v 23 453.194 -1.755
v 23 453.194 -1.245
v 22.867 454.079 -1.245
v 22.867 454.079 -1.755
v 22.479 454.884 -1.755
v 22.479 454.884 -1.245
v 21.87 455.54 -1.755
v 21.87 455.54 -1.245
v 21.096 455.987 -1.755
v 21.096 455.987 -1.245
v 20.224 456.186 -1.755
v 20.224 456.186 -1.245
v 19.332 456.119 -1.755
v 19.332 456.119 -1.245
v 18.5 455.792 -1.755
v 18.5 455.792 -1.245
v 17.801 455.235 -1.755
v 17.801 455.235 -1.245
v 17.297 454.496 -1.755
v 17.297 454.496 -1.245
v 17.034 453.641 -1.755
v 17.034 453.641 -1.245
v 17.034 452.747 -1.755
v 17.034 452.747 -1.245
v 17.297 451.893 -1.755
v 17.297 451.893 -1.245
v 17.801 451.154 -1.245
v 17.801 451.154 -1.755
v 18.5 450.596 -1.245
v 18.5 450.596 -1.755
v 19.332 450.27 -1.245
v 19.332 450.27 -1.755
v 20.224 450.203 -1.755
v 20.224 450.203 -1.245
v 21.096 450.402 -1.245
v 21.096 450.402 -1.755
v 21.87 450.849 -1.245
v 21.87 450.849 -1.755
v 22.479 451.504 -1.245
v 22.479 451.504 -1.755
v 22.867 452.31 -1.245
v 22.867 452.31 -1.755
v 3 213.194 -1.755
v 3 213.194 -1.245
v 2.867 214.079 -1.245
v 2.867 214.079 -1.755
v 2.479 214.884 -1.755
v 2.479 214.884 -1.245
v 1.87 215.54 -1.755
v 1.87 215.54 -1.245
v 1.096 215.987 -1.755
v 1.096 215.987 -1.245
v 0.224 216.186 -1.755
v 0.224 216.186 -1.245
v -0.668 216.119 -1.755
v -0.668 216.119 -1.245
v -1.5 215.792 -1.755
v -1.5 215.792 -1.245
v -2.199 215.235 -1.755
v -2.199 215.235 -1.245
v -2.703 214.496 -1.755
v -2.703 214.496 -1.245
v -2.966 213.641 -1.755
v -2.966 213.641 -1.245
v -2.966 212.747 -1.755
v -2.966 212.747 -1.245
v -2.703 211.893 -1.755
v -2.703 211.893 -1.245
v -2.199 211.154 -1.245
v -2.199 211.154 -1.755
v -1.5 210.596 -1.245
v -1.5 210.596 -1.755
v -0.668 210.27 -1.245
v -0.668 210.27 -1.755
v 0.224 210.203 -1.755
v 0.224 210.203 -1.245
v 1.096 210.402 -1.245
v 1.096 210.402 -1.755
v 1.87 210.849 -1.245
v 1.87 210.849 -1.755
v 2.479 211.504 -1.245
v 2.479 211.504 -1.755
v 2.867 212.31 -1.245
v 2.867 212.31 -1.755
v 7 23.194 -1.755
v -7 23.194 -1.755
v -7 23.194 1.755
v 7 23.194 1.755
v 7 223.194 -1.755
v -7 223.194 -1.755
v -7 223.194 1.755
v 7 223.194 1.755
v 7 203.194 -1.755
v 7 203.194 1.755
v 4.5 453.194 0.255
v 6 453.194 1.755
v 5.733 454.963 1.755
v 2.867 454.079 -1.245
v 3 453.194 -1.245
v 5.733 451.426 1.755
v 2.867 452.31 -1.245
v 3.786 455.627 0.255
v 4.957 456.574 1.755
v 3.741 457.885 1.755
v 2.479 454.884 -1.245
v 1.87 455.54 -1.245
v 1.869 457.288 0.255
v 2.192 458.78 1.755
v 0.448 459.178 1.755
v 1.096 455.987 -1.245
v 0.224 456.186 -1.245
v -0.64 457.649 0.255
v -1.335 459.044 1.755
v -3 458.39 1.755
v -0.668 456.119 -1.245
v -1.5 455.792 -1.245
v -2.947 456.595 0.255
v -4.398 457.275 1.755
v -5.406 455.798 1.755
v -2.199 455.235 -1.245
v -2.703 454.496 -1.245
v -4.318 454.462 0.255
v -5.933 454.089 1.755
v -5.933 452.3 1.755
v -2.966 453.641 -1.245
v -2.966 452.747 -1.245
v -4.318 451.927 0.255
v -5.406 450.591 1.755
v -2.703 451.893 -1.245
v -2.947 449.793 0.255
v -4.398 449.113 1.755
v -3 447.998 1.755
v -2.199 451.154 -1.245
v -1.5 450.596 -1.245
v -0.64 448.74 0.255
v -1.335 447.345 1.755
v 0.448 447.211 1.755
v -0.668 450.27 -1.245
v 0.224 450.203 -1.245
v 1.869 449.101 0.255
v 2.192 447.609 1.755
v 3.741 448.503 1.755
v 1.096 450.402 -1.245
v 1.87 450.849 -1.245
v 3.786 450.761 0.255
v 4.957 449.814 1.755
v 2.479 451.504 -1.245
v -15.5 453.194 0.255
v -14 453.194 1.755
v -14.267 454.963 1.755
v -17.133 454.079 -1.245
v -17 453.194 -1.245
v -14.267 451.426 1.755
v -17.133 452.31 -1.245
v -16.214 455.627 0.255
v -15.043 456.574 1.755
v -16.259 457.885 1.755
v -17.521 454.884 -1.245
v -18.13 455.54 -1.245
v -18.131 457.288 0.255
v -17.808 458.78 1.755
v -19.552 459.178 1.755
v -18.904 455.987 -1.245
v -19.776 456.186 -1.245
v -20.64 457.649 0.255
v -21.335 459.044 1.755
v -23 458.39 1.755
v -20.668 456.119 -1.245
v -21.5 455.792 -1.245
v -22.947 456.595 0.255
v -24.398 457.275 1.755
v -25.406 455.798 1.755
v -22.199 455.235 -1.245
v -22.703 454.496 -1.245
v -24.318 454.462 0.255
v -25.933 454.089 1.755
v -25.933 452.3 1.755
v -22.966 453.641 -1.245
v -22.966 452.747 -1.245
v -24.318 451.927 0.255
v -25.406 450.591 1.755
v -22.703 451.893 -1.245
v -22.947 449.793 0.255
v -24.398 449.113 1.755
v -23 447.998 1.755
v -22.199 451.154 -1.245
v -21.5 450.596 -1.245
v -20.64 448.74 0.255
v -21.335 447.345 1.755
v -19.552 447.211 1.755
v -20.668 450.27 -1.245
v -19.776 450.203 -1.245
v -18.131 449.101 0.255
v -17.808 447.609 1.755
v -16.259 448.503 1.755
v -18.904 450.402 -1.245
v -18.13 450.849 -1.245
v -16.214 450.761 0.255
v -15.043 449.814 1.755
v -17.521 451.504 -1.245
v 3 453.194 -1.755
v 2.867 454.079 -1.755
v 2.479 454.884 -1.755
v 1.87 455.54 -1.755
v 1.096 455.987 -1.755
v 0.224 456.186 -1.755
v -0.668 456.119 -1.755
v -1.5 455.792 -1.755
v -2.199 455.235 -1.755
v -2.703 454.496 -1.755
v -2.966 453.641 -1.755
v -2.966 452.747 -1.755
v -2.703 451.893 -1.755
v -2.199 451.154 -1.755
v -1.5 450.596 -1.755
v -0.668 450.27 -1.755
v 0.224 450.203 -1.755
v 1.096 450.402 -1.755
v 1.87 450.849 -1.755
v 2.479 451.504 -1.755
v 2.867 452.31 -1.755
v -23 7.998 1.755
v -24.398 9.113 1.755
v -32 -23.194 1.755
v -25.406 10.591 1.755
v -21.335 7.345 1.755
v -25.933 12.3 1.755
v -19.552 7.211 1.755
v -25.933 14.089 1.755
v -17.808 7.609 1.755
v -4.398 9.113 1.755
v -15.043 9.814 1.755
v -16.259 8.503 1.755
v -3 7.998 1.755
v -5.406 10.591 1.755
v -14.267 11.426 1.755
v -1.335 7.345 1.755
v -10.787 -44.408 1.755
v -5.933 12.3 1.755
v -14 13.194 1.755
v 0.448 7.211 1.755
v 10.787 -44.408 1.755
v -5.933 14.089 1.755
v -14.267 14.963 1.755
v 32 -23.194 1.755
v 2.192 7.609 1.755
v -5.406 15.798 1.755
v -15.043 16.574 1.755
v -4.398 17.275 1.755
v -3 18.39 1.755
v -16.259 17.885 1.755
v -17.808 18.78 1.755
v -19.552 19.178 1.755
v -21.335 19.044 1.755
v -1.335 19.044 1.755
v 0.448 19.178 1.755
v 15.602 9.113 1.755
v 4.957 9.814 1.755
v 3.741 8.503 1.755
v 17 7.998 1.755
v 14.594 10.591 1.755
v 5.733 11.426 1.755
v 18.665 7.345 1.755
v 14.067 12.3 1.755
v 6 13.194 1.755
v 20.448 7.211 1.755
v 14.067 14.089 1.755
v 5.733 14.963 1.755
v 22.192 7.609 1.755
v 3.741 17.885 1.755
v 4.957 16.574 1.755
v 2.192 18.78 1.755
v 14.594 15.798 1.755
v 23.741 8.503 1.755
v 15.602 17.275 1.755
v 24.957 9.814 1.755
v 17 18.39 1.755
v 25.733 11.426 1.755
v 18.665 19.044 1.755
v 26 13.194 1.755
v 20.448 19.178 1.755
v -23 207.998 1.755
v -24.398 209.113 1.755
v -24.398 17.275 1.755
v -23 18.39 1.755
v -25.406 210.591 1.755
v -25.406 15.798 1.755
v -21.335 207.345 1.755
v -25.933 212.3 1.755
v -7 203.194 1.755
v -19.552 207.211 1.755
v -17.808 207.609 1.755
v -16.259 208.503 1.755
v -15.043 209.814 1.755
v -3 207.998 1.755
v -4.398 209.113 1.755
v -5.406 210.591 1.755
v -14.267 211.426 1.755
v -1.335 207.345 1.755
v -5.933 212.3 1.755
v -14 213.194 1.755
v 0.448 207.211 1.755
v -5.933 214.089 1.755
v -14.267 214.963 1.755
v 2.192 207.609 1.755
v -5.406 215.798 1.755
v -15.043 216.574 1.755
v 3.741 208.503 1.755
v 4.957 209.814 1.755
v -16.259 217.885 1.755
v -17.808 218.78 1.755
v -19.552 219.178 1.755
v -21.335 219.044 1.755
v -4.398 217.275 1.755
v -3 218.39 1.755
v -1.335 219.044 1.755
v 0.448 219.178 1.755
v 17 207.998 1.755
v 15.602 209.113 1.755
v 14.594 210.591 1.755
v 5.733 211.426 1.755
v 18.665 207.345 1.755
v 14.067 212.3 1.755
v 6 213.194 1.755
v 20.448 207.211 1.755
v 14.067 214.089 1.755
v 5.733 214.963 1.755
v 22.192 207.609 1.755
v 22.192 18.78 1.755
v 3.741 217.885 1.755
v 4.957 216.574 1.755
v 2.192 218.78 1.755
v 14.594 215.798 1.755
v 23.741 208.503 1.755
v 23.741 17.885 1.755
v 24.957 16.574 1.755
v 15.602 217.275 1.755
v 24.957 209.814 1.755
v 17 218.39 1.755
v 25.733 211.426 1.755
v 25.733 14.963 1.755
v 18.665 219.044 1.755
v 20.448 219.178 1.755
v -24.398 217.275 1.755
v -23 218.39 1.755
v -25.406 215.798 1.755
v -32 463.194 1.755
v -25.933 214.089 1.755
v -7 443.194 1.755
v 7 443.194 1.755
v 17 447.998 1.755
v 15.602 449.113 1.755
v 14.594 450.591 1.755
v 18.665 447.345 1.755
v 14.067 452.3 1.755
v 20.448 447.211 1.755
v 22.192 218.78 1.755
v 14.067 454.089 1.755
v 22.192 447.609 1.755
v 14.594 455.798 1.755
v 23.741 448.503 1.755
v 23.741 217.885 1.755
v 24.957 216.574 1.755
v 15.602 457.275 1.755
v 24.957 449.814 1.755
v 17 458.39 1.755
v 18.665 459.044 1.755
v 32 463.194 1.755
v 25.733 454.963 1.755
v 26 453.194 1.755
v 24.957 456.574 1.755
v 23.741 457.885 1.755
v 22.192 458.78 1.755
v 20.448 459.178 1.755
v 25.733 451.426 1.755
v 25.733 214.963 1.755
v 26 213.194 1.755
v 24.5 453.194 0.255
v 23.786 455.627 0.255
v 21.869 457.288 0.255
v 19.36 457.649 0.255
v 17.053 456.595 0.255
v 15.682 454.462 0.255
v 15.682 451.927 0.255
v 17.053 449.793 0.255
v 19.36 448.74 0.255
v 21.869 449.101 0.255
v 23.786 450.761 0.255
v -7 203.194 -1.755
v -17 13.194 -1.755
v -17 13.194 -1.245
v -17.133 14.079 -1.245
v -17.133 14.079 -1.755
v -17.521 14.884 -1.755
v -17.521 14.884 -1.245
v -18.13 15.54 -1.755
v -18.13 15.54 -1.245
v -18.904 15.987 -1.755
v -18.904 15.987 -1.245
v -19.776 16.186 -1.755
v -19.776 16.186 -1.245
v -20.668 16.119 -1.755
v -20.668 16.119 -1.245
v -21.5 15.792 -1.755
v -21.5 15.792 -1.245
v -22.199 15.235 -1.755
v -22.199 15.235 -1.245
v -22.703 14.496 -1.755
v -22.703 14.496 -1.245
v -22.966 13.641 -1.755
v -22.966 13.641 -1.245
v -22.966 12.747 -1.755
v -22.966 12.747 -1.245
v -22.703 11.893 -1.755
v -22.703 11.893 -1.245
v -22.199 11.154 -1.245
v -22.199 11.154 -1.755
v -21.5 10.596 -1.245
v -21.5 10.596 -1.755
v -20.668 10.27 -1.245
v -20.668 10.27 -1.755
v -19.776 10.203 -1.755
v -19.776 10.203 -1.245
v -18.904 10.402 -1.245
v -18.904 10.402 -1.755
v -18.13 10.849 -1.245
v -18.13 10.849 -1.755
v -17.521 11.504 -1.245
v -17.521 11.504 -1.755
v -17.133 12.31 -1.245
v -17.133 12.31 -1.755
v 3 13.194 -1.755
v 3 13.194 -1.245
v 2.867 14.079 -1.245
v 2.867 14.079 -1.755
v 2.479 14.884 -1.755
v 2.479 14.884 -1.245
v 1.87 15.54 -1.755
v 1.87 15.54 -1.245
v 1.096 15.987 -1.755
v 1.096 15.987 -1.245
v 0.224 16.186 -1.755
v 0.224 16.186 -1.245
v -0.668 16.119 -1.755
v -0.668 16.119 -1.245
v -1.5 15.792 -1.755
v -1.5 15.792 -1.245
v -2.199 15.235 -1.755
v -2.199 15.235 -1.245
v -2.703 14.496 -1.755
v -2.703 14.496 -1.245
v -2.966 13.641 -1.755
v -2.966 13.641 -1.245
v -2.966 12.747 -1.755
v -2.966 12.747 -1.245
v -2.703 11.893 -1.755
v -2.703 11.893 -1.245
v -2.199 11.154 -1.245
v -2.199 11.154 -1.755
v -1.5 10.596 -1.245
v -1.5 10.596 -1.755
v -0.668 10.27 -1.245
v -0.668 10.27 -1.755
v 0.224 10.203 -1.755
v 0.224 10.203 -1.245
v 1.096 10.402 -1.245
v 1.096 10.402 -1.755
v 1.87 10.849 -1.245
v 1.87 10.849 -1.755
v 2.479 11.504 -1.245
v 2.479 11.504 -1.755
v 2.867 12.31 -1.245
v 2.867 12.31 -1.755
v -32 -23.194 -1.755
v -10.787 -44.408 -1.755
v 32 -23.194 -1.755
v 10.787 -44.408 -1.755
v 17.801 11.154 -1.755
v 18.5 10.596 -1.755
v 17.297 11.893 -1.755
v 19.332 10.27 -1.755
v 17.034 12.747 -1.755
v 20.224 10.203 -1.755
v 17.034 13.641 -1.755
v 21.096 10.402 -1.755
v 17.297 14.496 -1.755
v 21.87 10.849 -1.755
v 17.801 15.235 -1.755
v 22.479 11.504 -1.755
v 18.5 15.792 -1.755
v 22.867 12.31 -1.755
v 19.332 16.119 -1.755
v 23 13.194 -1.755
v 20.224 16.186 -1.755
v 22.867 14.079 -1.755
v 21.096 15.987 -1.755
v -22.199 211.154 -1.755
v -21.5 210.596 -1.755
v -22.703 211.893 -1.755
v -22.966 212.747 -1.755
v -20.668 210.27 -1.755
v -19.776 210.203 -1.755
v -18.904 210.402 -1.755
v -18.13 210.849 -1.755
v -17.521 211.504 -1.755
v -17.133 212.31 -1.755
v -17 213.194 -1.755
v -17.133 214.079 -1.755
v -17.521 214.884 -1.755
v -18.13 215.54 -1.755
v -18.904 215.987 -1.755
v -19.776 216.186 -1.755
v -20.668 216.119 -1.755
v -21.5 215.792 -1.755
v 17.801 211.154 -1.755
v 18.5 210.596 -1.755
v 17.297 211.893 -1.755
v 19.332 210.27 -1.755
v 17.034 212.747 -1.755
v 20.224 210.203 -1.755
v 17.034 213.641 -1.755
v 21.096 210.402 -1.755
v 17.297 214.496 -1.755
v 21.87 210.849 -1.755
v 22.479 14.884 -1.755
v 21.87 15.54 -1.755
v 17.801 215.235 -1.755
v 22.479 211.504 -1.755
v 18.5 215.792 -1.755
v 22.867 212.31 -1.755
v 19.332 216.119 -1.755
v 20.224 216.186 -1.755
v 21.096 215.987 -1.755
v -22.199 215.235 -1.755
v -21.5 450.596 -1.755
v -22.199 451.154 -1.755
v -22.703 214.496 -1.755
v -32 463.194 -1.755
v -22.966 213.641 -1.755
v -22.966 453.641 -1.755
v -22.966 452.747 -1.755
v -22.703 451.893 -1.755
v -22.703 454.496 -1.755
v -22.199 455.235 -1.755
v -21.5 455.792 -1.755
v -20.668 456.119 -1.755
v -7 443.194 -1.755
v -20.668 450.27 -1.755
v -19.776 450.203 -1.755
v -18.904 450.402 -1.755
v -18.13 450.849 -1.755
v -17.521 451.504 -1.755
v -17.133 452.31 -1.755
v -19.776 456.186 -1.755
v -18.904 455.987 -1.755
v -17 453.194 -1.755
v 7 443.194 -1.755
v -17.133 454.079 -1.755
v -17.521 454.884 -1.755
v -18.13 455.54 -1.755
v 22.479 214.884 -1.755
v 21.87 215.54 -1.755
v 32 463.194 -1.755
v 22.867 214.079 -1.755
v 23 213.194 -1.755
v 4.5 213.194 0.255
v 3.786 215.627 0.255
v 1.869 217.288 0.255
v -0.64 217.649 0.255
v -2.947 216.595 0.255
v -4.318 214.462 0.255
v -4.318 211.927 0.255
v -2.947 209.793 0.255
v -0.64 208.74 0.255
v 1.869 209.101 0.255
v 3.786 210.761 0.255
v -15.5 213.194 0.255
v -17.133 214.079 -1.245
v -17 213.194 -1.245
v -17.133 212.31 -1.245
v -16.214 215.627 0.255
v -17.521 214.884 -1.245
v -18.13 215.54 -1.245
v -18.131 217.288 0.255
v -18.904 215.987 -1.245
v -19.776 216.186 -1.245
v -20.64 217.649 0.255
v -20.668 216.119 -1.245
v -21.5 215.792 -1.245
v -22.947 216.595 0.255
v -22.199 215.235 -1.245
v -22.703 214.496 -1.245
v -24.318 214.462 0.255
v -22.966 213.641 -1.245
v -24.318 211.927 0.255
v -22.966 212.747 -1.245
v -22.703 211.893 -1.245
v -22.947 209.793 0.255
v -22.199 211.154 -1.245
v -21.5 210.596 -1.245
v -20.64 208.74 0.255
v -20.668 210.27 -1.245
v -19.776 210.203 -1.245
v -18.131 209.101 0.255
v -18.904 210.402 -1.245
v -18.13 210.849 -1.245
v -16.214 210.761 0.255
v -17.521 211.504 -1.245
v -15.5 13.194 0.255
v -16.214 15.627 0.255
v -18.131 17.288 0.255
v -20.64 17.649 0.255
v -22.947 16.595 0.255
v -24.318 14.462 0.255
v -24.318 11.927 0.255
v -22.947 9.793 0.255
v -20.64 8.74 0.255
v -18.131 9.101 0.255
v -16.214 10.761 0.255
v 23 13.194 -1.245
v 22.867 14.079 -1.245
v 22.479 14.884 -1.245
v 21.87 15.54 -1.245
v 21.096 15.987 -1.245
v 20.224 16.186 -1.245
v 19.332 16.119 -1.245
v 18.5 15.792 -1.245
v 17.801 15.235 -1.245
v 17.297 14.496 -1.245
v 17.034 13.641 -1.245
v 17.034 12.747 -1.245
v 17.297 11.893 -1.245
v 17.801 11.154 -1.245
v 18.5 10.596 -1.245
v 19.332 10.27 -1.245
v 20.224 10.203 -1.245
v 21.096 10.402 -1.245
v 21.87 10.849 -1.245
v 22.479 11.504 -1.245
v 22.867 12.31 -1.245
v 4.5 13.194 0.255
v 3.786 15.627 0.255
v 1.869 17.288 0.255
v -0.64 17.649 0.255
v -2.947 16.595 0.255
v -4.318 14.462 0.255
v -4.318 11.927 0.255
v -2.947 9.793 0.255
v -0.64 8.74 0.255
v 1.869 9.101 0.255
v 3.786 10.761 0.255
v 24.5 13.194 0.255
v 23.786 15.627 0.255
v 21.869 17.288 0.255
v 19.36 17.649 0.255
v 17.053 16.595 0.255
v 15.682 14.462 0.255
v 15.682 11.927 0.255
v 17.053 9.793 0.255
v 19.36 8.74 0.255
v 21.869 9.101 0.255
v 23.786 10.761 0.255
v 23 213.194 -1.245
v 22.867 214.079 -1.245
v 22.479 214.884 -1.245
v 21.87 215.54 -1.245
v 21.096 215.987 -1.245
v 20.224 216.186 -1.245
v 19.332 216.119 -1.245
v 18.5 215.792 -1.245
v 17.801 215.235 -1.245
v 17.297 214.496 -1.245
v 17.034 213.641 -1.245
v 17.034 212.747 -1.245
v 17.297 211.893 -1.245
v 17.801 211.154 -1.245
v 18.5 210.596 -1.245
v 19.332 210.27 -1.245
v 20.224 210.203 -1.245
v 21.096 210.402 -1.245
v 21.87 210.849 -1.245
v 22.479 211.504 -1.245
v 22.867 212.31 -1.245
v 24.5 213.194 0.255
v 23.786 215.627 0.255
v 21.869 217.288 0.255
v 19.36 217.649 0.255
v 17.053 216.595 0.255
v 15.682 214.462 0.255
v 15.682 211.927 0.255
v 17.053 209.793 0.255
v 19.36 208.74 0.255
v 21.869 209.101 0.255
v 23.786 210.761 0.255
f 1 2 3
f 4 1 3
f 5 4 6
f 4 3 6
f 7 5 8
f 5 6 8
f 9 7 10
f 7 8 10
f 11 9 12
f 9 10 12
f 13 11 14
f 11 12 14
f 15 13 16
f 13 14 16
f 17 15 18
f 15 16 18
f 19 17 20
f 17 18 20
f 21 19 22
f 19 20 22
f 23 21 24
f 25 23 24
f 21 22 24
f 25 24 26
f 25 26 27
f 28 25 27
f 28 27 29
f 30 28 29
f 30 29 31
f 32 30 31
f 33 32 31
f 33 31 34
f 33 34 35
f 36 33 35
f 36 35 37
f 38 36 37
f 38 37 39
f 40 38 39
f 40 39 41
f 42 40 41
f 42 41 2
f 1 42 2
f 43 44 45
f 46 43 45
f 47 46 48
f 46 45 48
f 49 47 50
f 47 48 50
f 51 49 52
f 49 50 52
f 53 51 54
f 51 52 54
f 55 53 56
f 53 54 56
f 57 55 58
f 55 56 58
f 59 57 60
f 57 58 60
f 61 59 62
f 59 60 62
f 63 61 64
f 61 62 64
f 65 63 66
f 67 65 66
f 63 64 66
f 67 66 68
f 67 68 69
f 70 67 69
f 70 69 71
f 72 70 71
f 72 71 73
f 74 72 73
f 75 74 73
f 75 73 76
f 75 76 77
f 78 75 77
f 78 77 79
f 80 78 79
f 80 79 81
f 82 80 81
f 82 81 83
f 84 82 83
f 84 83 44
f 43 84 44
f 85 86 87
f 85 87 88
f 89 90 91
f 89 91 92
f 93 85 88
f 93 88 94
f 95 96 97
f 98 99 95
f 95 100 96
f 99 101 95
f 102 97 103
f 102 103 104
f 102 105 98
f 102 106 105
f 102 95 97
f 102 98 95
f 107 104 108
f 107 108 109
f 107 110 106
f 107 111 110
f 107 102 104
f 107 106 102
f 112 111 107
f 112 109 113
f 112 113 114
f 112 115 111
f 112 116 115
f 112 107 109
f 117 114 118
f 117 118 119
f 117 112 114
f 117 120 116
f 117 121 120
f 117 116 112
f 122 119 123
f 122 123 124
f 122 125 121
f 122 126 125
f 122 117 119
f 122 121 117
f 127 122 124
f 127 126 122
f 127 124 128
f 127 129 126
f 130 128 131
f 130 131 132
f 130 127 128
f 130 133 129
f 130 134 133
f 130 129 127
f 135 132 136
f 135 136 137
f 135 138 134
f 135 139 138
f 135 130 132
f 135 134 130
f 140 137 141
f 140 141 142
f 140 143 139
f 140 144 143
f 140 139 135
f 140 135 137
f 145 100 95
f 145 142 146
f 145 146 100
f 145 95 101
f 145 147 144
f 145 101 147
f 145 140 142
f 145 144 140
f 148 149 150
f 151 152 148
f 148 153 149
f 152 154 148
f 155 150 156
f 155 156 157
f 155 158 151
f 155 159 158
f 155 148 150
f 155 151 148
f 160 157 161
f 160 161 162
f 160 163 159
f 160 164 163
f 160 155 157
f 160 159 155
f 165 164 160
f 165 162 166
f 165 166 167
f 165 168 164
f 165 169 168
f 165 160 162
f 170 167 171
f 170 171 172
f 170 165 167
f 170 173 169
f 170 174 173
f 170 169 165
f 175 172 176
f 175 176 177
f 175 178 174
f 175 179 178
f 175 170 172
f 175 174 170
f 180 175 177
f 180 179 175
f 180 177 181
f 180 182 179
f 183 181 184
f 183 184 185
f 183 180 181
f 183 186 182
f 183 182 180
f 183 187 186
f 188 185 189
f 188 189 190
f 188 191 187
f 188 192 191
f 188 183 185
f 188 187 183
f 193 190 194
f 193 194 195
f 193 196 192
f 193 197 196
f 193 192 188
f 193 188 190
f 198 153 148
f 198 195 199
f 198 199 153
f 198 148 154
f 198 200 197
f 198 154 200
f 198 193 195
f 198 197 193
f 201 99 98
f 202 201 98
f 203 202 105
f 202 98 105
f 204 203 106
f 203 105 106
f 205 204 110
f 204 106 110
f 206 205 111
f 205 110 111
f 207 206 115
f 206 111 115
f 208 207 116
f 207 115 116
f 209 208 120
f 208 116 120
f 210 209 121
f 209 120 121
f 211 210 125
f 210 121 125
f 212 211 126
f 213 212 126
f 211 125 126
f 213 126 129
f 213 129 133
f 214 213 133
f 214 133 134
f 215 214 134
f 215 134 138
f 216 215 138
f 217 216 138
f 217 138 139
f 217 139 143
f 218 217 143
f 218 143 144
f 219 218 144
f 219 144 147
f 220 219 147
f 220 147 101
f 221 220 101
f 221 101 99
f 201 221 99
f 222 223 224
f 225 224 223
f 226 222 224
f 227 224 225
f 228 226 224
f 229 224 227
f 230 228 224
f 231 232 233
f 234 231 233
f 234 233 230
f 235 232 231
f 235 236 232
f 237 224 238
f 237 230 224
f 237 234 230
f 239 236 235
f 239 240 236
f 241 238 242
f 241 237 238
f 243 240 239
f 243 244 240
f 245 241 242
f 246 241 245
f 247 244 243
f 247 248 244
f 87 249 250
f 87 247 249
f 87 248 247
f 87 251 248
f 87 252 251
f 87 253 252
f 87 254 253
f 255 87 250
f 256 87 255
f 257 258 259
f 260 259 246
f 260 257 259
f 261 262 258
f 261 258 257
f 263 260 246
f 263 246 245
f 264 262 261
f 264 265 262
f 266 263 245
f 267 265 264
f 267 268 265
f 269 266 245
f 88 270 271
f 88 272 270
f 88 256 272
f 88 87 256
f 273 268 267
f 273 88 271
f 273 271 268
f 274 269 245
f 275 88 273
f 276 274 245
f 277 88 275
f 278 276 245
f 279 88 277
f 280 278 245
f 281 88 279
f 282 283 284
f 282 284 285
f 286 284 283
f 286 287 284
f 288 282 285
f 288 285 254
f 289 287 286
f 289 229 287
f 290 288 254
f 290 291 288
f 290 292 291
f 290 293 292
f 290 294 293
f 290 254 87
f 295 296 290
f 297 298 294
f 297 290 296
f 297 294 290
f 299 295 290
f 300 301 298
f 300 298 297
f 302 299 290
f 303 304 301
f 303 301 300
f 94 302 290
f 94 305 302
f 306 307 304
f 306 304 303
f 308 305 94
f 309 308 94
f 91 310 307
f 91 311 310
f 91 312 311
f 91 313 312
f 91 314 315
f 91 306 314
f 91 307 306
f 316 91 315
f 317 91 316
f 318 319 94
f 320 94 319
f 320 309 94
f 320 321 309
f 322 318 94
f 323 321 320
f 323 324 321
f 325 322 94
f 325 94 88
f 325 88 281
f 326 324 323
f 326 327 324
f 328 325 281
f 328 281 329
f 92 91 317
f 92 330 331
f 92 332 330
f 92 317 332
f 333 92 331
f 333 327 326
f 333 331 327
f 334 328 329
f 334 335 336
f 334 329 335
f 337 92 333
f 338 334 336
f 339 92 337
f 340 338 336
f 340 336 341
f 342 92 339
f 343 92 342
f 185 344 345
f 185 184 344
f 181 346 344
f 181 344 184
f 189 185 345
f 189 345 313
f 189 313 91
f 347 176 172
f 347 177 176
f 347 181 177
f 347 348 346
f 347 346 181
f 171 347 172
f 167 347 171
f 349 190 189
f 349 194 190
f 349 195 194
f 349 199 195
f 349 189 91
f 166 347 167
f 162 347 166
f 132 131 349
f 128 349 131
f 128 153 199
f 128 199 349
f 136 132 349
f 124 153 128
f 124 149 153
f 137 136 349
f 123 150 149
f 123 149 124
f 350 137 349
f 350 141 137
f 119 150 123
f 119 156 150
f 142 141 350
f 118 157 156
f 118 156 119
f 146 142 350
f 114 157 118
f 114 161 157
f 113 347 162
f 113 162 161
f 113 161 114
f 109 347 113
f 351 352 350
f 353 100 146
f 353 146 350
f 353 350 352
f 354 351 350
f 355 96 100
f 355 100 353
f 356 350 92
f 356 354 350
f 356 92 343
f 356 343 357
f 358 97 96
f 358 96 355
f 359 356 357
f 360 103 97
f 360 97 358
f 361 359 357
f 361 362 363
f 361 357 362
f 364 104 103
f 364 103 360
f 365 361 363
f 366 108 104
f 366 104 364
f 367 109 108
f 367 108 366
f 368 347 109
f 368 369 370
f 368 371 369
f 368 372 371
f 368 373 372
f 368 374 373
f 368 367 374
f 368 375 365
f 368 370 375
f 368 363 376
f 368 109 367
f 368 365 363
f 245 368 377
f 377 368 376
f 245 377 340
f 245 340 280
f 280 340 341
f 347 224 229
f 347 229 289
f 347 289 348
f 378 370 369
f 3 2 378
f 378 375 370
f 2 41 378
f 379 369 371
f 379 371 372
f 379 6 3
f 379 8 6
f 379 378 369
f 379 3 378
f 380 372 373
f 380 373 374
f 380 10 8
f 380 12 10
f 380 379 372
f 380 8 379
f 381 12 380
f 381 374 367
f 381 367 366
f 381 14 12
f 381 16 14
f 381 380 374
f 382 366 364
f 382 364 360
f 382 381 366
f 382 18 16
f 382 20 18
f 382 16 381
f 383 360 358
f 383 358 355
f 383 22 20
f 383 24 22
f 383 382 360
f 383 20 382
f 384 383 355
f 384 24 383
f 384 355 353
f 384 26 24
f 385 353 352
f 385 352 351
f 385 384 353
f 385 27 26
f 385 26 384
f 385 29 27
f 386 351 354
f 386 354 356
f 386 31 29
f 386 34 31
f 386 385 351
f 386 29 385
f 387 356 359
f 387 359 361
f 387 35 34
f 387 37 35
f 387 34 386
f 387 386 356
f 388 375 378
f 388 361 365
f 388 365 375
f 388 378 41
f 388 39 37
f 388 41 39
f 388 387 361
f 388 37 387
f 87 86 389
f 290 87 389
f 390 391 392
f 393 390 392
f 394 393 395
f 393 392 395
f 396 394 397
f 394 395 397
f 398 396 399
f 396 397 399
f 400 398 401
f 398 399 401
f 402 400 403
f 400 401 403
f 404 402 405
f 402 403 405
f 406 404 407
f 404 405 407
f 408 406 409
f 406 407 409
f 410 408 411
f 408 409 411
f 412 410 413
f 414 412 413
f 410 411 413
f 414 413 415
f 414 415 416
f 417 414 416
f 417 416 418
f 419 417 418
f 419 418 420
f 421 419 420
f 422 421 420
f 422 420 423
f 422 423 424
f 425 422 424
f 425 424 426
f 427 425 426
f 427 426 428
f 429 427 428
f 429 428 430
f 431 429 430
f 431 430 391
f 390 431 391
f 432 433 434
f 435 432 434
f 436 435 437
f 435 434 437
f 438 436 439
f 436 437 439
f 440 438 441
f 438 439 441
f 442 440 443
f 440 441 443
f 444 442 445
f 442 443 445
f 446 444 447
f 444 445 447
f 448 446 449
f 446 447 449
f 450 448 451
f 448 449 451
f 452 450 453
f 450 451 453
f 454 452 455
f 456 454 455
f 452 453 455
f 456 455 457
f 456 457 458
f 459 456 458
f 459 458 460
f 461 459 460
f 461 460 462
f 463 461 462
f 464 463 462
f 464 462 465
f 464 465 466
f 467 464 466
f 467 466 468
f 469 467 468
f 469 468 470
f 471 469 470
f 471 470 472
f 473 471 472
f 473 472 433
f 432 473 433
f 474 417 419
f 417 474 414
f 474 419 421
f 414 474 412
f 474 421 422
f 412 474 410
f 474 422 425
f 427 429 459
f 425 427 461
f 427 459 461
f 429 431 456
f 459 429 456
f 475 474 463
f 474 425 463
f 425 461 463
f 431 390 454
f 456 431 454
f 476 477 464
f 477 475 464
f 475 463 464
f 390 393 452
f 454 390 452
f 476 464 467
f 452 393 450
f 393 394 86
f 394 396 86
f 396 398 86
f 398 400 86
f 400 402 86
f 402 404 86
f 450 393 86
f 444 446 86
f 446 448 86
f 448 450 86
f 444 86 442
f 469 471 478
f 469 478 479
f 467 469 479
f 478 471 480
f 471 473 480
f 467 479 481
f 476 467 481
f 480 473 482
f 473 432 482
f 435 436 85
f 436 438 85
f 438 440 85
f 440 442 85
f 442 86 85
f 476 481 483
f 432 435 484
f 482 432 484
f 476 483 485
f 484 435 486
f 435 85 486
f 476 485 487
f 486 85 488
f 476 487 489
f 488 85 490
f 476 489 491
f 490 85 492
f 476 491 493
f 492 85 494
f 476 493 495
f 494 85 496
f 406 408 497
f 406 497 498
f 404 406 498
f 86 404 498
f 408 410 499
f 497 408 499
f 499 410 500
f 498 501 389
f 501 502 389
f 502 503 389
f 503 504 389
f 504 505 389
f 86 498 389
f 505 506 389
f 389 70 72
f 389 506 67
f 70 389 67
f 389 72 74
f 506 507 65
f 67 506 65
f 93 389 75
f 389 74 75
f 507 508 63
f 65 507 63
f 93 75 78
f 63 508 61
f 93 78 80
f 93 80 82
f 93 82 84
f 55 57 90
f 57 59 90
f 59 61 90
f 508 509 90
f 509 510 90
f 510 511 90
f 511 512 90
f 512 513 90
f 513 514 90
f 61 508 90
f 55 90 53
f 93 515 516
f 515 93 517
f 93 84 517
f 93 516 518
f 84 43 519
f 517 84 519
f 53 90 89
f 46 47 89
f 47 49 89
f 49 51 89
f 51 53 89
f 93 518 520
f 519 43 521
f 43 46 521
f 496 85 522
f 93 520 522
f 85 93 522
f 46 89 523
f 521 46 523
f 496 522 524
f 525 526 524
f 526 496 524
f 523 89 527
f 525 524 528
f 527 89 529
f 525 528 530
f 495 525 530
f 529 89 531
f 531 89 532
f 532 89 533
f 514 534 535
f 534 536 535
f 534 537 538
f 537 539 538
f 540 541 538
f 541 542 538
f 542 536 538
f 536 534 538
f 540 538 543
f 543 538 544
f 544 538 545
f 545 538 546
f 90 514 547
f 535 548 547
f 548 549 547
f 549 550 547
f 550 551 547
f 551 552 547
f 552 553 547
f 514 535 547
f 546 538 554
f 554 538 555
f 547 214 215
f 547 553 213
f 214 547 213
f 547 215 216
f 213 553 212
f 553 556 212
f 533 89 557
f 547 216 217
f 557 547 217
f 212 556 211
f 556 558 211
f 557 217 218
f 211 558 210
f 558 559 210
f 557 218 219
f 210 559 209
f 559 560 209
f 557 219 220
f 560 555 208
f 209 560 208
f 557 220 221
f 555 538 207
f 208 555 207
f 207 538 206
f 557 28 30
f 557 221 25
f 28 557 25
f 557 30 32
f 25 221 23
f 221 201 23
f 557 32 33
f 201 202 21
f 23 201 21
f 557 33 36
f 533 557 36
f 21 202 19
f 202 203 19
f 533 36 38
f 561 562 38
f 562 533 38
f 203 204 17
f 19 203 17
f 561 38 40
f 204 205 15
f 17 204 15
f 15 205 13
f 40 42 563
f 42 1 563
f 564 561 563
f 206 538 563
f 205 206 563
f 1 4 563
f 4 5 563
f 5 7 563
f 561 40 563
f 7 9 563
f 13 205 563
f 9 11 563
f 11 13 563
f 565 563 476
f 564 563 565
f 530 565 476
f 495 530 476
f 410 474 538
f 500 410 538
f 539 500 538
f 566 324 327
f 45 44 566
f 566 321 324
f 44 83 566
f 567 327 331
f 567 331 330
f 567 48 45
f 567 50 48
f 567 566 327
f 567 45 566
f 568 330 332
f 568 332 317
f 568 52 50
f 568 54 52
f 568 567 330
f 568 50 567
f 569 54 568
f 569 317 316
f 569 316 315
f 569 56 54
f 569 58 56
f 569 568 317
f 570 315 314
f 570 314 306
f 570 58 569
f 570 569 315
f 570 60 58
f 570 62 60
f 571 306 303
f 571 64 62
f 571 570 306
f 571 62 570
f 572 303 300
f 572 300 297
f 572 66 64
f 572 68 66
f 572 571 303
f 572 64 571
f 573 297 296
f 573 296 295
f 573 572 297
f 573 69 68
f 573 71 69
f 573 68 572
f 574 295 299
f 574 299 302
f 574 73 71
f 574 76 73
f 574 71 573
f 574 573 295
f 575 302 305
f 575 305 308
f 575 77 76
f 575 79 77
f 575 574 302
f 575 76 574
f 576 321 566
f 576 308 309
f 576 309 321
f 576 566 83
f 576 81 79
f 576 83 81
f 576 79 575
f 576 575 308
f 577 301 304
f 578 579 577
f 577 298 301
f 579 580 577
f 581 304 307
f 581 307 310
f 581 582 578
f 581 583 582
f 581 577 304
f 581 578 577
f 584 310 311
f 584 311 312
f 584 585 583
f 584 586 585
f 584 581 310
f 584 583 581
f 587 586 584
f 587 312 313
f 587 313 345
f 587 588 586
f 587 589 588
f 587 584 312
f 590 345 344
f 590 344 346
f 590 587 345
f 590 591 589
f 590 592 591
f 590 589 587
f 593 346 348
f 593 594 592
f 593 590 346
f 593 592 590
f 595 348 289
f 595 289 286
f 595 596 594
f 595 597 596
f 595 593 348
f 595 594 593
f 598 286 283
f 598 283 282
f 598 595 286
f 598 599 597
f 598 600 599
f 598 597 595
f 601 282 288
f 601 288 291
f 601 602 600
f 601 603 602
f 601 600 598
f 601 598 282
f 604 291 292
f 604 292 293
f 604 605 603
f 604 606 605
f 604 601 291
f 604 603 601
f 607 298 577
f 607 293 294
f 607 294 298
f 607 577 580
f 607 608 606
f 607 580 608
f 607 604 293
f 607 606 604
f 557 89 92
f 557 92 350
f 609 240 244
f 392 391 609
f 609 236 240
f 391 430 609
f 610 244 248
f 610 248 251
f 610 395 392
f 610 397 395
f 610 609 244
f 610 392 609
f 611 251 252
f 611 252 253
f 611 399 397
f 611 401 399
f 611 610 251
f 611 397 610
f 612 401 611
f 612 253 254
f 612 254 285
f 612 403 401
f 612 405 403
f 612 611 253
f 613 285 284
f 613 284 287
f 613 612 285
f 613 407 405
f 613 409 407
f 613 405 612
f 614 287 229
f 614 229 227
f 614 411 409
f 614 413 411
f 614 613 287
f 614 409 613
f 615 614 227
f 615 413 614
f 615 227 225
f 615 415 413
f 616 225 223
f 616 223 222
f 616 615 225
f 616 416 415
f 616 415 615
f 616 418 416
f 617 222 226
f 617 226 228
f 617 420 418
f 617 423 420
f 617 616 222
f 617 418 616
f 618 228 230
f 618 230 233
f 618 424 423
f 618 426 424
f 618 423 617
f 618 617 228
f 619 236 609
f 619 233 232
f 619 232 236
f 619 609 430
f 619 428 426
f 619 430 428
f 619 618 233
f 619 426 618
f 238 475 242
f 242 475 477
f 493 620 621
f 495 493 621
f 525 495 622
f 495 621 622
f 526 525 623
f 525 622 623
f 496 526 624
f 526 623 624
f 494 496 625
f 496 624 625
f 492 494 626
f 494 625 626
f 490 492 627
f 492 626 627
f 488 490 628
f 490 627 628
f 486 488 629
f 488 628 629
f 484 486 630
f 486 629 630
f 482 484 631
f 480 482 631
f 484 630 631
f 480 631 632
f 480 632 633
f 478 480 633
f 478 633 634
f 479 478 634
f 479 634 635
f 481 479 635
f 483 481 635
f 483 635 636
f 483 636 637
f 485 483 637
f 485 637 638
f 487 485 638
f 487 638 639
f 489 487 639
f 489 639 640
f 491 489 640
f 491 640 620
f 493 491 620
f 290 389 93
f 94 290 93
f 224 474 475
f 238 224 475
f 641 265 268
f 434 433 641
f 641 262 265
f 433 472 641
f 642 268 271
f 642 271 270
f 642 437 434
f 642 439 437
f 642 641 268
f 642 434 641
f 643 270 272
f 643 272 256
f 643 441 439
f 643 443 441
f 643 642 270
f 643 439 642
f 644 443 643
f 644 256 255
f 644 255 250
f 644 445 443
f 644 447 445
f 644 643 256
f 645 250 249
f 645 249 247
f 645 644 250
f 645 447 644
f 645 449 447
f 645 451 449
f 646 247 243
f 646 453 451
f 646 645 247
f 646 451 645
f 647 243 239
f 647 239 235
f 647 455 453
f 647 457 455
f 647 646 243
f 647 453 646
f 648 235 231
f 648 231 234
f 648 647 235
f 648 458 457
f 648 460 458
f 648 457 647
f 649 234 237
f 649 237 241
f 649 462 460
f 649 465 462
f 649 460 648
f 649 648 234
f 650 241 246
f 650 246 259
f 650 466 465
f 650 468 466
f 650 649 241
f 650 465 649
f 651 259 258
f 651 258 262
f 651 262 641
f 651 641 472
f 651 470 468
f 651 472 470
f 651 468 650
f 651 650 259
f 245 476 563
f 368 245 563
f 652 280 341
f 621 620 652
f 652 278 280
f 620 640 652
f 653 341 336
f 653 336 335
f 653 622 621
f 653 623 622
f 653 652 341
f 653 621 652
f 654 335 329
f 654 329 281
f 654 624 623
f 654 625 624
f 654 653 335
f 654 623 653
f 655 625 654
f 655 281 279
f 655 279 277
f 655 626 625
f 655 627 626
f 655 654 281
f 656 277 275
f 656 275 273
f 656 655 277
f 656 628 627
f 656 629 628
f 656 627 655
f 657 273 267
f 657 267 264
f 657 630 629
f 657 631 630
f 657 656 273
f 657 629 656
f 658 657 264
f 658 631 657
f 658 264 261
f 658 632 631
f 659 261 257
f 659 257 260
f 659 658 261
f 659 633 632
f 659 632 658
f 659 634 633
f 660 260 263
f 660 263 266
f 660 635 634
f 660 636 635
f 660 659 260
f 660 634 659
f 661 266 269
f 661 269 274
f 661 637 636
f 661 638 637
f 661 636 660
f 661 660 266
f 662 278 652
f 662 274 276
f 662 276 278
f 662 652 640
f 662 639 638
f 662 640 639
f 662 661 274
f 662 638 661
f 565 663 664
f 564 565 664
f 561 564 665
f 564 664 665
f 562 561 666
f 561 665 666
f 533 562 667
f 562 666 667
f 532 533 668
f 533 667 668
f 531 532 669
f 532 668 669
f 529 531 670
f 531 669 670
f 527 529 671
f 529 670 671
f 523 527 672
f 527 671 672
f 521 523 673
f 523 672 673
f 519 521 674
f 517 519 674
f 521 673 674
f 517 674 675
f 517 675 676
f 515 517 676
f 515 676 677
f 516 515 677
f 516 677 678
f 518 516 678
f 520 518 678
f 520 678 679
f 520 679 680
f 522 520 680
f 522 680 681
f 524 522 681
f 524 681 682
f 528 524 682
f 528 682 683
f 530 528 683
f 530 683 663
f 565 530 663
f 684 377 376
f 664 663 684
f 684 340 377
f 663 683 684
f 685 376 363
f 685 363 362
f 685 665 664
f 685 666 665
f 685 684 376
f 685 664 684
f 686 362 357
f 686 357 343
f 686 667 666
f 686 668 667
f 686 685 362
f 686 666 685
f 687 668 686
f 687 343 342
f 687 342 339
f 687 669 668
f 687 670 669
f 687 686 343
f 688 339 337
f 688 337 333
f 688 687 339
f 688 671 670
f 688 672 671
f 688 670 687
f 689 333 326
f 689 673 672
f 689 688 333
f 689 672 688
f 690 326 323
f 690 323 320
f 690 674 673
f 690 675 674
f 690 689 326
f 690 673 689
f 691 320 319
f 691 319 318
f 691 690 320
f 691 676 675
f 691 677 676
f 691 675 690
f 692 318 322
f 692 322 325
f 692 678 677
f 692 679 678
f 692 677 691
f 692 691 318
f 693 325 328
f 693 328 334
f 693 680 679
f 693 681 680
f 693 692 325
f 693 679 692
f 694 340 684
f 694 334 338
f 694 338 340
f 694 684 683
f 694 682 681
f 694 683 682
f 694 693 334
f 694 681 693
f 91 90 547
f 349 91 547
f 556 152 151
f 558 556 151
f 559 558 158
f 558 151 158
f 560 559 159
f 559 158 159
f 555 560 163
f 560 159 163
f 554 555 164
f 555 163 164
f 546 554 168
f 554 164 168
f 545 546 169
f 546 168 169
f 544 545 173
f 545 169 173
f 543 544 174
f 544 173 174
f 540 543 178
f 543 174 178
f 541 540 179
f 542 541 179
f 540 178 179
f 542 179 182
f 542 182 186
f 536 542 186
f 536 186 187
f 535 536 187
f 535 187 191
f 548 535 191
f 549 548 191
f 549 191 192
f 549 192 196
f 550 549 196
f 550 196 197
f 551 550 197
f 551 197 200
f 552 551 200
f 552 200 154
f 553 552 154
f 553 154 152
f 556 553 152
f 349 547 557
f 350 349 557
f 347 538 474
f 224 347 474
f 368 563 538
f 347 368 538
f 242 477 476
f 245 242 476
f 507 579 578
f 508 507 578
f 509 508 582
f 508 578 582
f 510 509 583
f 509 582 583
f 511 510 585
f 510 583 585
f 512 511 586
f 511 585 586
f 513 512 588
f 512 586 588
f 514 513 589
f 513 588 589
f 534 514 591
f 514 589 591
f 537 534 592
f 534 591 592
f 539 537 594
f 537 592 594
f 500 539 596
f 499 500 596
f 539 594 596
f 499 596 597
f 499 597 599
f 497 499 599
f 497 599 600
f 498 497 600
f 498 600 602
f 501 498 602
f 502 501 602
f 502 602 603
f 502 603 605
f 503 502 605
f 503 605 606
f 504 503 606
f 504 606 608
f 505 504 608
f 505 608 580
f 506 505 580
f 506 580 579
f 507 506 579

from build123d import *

# Parameters (mm, degrees)
BASE_FLANGE1_START       = -1.755
BASE_FLANGE1_OUTLINE_W   = 14
BASE_FLANGE1_OUTLINE_H   = 180
BASE_FLANGE1_OUTLINE_H_2 = 220
BASE_FLANGE1_DEPTH       = 3.51
SKETCH2_R                = 3
CUT_EXTRUDE2_DEPTH       = 10
CHAMFER1_SIZE            = 3


# Read off the part's stored shape, not the designer's step: Base-Flange1
with BuildPart() as part:
    # Base-Flange1 outline → Base-Flange1 (new body)
    with BuildSketch(Plane.XY.offset(BASE_FLANGE1_START)):
        Polygon((10.786796564, -44.407529677), (32, -23.194326241), (32, 463.194326241), (-32, 463.194326241), (-32, -23.194326241), (-10.786796564, -44.407529677), align=None)
        with Locations((0, 113.194326241)):
            Rectangle(BASE_FLANGE1_OUTLINE_W, BASE_FLANGE1_OUTLINE_H, mode=Mode.SUBTRACT)
        with Locations((0, 333.194326241)):
            Rectangle(BASE_FLANGE1_OUTLINE_W, BASE_FLANGE1_OUTLINE_H_2, mode=Mode.SUBTRACT)
    extrude(amount=BASE_FLANGE1_DEPTH)

    # Sketch2 → Cut-Extrude2 (cut)
    with BuildSketch(Plane.XY.offset(1.755)):
        with Locations((-20, 213.194326241)):
            Circle(SKETCH2_R)
        with Locations((0, 213.194326241)):
            Circle(SKETCH2_R)
        with Locations((20, 213.194326241)):
            Circle(SKETCH2_R)
        with Locations((0, 453.194326241)):
            Circle(SKETCH2_R)
        with Locations((20, 453.194326241)):
            Circle(SKETCH2_R)
        with Locations((-20, 453.194326241)):
            Circle(SKETCH2_R)
        with Locations((0, 13.194326241)):
            Circle(SKETCH2_R)
        with Locations((20, 13.194326241)):
            Circle(SKETCH2_R)
        with Locations((-20, 13.194326241)):
            Circle(SKETCH2_R)
    extrude(amount=-CUT_EXTRUDE2_DEPTH, mode=Mode.SUBTRACT)

    # Chamfer1
    chamfer1_edges = [part.edges().sort_by_distance(p)[0] for p in [
        (-3, 453.194326241, 1.755),
        (17, 453.194326241, 1.755),
        (-23, 13.194326241, 1.755),
        (17, 13.194326241, 1.755),
        (-3, 13.194326241, 1.755),
        (-23, 453.194326241, 1.755),
        (-23, 213.194326241, 1.755),
        (-3, 213.194326241, 1.755),
        (17, 213.194326241, 1.755),
    ]]
    chamfer(chamfer1_edges, length=CHAMFER1_SIZE)


solid = part.part
